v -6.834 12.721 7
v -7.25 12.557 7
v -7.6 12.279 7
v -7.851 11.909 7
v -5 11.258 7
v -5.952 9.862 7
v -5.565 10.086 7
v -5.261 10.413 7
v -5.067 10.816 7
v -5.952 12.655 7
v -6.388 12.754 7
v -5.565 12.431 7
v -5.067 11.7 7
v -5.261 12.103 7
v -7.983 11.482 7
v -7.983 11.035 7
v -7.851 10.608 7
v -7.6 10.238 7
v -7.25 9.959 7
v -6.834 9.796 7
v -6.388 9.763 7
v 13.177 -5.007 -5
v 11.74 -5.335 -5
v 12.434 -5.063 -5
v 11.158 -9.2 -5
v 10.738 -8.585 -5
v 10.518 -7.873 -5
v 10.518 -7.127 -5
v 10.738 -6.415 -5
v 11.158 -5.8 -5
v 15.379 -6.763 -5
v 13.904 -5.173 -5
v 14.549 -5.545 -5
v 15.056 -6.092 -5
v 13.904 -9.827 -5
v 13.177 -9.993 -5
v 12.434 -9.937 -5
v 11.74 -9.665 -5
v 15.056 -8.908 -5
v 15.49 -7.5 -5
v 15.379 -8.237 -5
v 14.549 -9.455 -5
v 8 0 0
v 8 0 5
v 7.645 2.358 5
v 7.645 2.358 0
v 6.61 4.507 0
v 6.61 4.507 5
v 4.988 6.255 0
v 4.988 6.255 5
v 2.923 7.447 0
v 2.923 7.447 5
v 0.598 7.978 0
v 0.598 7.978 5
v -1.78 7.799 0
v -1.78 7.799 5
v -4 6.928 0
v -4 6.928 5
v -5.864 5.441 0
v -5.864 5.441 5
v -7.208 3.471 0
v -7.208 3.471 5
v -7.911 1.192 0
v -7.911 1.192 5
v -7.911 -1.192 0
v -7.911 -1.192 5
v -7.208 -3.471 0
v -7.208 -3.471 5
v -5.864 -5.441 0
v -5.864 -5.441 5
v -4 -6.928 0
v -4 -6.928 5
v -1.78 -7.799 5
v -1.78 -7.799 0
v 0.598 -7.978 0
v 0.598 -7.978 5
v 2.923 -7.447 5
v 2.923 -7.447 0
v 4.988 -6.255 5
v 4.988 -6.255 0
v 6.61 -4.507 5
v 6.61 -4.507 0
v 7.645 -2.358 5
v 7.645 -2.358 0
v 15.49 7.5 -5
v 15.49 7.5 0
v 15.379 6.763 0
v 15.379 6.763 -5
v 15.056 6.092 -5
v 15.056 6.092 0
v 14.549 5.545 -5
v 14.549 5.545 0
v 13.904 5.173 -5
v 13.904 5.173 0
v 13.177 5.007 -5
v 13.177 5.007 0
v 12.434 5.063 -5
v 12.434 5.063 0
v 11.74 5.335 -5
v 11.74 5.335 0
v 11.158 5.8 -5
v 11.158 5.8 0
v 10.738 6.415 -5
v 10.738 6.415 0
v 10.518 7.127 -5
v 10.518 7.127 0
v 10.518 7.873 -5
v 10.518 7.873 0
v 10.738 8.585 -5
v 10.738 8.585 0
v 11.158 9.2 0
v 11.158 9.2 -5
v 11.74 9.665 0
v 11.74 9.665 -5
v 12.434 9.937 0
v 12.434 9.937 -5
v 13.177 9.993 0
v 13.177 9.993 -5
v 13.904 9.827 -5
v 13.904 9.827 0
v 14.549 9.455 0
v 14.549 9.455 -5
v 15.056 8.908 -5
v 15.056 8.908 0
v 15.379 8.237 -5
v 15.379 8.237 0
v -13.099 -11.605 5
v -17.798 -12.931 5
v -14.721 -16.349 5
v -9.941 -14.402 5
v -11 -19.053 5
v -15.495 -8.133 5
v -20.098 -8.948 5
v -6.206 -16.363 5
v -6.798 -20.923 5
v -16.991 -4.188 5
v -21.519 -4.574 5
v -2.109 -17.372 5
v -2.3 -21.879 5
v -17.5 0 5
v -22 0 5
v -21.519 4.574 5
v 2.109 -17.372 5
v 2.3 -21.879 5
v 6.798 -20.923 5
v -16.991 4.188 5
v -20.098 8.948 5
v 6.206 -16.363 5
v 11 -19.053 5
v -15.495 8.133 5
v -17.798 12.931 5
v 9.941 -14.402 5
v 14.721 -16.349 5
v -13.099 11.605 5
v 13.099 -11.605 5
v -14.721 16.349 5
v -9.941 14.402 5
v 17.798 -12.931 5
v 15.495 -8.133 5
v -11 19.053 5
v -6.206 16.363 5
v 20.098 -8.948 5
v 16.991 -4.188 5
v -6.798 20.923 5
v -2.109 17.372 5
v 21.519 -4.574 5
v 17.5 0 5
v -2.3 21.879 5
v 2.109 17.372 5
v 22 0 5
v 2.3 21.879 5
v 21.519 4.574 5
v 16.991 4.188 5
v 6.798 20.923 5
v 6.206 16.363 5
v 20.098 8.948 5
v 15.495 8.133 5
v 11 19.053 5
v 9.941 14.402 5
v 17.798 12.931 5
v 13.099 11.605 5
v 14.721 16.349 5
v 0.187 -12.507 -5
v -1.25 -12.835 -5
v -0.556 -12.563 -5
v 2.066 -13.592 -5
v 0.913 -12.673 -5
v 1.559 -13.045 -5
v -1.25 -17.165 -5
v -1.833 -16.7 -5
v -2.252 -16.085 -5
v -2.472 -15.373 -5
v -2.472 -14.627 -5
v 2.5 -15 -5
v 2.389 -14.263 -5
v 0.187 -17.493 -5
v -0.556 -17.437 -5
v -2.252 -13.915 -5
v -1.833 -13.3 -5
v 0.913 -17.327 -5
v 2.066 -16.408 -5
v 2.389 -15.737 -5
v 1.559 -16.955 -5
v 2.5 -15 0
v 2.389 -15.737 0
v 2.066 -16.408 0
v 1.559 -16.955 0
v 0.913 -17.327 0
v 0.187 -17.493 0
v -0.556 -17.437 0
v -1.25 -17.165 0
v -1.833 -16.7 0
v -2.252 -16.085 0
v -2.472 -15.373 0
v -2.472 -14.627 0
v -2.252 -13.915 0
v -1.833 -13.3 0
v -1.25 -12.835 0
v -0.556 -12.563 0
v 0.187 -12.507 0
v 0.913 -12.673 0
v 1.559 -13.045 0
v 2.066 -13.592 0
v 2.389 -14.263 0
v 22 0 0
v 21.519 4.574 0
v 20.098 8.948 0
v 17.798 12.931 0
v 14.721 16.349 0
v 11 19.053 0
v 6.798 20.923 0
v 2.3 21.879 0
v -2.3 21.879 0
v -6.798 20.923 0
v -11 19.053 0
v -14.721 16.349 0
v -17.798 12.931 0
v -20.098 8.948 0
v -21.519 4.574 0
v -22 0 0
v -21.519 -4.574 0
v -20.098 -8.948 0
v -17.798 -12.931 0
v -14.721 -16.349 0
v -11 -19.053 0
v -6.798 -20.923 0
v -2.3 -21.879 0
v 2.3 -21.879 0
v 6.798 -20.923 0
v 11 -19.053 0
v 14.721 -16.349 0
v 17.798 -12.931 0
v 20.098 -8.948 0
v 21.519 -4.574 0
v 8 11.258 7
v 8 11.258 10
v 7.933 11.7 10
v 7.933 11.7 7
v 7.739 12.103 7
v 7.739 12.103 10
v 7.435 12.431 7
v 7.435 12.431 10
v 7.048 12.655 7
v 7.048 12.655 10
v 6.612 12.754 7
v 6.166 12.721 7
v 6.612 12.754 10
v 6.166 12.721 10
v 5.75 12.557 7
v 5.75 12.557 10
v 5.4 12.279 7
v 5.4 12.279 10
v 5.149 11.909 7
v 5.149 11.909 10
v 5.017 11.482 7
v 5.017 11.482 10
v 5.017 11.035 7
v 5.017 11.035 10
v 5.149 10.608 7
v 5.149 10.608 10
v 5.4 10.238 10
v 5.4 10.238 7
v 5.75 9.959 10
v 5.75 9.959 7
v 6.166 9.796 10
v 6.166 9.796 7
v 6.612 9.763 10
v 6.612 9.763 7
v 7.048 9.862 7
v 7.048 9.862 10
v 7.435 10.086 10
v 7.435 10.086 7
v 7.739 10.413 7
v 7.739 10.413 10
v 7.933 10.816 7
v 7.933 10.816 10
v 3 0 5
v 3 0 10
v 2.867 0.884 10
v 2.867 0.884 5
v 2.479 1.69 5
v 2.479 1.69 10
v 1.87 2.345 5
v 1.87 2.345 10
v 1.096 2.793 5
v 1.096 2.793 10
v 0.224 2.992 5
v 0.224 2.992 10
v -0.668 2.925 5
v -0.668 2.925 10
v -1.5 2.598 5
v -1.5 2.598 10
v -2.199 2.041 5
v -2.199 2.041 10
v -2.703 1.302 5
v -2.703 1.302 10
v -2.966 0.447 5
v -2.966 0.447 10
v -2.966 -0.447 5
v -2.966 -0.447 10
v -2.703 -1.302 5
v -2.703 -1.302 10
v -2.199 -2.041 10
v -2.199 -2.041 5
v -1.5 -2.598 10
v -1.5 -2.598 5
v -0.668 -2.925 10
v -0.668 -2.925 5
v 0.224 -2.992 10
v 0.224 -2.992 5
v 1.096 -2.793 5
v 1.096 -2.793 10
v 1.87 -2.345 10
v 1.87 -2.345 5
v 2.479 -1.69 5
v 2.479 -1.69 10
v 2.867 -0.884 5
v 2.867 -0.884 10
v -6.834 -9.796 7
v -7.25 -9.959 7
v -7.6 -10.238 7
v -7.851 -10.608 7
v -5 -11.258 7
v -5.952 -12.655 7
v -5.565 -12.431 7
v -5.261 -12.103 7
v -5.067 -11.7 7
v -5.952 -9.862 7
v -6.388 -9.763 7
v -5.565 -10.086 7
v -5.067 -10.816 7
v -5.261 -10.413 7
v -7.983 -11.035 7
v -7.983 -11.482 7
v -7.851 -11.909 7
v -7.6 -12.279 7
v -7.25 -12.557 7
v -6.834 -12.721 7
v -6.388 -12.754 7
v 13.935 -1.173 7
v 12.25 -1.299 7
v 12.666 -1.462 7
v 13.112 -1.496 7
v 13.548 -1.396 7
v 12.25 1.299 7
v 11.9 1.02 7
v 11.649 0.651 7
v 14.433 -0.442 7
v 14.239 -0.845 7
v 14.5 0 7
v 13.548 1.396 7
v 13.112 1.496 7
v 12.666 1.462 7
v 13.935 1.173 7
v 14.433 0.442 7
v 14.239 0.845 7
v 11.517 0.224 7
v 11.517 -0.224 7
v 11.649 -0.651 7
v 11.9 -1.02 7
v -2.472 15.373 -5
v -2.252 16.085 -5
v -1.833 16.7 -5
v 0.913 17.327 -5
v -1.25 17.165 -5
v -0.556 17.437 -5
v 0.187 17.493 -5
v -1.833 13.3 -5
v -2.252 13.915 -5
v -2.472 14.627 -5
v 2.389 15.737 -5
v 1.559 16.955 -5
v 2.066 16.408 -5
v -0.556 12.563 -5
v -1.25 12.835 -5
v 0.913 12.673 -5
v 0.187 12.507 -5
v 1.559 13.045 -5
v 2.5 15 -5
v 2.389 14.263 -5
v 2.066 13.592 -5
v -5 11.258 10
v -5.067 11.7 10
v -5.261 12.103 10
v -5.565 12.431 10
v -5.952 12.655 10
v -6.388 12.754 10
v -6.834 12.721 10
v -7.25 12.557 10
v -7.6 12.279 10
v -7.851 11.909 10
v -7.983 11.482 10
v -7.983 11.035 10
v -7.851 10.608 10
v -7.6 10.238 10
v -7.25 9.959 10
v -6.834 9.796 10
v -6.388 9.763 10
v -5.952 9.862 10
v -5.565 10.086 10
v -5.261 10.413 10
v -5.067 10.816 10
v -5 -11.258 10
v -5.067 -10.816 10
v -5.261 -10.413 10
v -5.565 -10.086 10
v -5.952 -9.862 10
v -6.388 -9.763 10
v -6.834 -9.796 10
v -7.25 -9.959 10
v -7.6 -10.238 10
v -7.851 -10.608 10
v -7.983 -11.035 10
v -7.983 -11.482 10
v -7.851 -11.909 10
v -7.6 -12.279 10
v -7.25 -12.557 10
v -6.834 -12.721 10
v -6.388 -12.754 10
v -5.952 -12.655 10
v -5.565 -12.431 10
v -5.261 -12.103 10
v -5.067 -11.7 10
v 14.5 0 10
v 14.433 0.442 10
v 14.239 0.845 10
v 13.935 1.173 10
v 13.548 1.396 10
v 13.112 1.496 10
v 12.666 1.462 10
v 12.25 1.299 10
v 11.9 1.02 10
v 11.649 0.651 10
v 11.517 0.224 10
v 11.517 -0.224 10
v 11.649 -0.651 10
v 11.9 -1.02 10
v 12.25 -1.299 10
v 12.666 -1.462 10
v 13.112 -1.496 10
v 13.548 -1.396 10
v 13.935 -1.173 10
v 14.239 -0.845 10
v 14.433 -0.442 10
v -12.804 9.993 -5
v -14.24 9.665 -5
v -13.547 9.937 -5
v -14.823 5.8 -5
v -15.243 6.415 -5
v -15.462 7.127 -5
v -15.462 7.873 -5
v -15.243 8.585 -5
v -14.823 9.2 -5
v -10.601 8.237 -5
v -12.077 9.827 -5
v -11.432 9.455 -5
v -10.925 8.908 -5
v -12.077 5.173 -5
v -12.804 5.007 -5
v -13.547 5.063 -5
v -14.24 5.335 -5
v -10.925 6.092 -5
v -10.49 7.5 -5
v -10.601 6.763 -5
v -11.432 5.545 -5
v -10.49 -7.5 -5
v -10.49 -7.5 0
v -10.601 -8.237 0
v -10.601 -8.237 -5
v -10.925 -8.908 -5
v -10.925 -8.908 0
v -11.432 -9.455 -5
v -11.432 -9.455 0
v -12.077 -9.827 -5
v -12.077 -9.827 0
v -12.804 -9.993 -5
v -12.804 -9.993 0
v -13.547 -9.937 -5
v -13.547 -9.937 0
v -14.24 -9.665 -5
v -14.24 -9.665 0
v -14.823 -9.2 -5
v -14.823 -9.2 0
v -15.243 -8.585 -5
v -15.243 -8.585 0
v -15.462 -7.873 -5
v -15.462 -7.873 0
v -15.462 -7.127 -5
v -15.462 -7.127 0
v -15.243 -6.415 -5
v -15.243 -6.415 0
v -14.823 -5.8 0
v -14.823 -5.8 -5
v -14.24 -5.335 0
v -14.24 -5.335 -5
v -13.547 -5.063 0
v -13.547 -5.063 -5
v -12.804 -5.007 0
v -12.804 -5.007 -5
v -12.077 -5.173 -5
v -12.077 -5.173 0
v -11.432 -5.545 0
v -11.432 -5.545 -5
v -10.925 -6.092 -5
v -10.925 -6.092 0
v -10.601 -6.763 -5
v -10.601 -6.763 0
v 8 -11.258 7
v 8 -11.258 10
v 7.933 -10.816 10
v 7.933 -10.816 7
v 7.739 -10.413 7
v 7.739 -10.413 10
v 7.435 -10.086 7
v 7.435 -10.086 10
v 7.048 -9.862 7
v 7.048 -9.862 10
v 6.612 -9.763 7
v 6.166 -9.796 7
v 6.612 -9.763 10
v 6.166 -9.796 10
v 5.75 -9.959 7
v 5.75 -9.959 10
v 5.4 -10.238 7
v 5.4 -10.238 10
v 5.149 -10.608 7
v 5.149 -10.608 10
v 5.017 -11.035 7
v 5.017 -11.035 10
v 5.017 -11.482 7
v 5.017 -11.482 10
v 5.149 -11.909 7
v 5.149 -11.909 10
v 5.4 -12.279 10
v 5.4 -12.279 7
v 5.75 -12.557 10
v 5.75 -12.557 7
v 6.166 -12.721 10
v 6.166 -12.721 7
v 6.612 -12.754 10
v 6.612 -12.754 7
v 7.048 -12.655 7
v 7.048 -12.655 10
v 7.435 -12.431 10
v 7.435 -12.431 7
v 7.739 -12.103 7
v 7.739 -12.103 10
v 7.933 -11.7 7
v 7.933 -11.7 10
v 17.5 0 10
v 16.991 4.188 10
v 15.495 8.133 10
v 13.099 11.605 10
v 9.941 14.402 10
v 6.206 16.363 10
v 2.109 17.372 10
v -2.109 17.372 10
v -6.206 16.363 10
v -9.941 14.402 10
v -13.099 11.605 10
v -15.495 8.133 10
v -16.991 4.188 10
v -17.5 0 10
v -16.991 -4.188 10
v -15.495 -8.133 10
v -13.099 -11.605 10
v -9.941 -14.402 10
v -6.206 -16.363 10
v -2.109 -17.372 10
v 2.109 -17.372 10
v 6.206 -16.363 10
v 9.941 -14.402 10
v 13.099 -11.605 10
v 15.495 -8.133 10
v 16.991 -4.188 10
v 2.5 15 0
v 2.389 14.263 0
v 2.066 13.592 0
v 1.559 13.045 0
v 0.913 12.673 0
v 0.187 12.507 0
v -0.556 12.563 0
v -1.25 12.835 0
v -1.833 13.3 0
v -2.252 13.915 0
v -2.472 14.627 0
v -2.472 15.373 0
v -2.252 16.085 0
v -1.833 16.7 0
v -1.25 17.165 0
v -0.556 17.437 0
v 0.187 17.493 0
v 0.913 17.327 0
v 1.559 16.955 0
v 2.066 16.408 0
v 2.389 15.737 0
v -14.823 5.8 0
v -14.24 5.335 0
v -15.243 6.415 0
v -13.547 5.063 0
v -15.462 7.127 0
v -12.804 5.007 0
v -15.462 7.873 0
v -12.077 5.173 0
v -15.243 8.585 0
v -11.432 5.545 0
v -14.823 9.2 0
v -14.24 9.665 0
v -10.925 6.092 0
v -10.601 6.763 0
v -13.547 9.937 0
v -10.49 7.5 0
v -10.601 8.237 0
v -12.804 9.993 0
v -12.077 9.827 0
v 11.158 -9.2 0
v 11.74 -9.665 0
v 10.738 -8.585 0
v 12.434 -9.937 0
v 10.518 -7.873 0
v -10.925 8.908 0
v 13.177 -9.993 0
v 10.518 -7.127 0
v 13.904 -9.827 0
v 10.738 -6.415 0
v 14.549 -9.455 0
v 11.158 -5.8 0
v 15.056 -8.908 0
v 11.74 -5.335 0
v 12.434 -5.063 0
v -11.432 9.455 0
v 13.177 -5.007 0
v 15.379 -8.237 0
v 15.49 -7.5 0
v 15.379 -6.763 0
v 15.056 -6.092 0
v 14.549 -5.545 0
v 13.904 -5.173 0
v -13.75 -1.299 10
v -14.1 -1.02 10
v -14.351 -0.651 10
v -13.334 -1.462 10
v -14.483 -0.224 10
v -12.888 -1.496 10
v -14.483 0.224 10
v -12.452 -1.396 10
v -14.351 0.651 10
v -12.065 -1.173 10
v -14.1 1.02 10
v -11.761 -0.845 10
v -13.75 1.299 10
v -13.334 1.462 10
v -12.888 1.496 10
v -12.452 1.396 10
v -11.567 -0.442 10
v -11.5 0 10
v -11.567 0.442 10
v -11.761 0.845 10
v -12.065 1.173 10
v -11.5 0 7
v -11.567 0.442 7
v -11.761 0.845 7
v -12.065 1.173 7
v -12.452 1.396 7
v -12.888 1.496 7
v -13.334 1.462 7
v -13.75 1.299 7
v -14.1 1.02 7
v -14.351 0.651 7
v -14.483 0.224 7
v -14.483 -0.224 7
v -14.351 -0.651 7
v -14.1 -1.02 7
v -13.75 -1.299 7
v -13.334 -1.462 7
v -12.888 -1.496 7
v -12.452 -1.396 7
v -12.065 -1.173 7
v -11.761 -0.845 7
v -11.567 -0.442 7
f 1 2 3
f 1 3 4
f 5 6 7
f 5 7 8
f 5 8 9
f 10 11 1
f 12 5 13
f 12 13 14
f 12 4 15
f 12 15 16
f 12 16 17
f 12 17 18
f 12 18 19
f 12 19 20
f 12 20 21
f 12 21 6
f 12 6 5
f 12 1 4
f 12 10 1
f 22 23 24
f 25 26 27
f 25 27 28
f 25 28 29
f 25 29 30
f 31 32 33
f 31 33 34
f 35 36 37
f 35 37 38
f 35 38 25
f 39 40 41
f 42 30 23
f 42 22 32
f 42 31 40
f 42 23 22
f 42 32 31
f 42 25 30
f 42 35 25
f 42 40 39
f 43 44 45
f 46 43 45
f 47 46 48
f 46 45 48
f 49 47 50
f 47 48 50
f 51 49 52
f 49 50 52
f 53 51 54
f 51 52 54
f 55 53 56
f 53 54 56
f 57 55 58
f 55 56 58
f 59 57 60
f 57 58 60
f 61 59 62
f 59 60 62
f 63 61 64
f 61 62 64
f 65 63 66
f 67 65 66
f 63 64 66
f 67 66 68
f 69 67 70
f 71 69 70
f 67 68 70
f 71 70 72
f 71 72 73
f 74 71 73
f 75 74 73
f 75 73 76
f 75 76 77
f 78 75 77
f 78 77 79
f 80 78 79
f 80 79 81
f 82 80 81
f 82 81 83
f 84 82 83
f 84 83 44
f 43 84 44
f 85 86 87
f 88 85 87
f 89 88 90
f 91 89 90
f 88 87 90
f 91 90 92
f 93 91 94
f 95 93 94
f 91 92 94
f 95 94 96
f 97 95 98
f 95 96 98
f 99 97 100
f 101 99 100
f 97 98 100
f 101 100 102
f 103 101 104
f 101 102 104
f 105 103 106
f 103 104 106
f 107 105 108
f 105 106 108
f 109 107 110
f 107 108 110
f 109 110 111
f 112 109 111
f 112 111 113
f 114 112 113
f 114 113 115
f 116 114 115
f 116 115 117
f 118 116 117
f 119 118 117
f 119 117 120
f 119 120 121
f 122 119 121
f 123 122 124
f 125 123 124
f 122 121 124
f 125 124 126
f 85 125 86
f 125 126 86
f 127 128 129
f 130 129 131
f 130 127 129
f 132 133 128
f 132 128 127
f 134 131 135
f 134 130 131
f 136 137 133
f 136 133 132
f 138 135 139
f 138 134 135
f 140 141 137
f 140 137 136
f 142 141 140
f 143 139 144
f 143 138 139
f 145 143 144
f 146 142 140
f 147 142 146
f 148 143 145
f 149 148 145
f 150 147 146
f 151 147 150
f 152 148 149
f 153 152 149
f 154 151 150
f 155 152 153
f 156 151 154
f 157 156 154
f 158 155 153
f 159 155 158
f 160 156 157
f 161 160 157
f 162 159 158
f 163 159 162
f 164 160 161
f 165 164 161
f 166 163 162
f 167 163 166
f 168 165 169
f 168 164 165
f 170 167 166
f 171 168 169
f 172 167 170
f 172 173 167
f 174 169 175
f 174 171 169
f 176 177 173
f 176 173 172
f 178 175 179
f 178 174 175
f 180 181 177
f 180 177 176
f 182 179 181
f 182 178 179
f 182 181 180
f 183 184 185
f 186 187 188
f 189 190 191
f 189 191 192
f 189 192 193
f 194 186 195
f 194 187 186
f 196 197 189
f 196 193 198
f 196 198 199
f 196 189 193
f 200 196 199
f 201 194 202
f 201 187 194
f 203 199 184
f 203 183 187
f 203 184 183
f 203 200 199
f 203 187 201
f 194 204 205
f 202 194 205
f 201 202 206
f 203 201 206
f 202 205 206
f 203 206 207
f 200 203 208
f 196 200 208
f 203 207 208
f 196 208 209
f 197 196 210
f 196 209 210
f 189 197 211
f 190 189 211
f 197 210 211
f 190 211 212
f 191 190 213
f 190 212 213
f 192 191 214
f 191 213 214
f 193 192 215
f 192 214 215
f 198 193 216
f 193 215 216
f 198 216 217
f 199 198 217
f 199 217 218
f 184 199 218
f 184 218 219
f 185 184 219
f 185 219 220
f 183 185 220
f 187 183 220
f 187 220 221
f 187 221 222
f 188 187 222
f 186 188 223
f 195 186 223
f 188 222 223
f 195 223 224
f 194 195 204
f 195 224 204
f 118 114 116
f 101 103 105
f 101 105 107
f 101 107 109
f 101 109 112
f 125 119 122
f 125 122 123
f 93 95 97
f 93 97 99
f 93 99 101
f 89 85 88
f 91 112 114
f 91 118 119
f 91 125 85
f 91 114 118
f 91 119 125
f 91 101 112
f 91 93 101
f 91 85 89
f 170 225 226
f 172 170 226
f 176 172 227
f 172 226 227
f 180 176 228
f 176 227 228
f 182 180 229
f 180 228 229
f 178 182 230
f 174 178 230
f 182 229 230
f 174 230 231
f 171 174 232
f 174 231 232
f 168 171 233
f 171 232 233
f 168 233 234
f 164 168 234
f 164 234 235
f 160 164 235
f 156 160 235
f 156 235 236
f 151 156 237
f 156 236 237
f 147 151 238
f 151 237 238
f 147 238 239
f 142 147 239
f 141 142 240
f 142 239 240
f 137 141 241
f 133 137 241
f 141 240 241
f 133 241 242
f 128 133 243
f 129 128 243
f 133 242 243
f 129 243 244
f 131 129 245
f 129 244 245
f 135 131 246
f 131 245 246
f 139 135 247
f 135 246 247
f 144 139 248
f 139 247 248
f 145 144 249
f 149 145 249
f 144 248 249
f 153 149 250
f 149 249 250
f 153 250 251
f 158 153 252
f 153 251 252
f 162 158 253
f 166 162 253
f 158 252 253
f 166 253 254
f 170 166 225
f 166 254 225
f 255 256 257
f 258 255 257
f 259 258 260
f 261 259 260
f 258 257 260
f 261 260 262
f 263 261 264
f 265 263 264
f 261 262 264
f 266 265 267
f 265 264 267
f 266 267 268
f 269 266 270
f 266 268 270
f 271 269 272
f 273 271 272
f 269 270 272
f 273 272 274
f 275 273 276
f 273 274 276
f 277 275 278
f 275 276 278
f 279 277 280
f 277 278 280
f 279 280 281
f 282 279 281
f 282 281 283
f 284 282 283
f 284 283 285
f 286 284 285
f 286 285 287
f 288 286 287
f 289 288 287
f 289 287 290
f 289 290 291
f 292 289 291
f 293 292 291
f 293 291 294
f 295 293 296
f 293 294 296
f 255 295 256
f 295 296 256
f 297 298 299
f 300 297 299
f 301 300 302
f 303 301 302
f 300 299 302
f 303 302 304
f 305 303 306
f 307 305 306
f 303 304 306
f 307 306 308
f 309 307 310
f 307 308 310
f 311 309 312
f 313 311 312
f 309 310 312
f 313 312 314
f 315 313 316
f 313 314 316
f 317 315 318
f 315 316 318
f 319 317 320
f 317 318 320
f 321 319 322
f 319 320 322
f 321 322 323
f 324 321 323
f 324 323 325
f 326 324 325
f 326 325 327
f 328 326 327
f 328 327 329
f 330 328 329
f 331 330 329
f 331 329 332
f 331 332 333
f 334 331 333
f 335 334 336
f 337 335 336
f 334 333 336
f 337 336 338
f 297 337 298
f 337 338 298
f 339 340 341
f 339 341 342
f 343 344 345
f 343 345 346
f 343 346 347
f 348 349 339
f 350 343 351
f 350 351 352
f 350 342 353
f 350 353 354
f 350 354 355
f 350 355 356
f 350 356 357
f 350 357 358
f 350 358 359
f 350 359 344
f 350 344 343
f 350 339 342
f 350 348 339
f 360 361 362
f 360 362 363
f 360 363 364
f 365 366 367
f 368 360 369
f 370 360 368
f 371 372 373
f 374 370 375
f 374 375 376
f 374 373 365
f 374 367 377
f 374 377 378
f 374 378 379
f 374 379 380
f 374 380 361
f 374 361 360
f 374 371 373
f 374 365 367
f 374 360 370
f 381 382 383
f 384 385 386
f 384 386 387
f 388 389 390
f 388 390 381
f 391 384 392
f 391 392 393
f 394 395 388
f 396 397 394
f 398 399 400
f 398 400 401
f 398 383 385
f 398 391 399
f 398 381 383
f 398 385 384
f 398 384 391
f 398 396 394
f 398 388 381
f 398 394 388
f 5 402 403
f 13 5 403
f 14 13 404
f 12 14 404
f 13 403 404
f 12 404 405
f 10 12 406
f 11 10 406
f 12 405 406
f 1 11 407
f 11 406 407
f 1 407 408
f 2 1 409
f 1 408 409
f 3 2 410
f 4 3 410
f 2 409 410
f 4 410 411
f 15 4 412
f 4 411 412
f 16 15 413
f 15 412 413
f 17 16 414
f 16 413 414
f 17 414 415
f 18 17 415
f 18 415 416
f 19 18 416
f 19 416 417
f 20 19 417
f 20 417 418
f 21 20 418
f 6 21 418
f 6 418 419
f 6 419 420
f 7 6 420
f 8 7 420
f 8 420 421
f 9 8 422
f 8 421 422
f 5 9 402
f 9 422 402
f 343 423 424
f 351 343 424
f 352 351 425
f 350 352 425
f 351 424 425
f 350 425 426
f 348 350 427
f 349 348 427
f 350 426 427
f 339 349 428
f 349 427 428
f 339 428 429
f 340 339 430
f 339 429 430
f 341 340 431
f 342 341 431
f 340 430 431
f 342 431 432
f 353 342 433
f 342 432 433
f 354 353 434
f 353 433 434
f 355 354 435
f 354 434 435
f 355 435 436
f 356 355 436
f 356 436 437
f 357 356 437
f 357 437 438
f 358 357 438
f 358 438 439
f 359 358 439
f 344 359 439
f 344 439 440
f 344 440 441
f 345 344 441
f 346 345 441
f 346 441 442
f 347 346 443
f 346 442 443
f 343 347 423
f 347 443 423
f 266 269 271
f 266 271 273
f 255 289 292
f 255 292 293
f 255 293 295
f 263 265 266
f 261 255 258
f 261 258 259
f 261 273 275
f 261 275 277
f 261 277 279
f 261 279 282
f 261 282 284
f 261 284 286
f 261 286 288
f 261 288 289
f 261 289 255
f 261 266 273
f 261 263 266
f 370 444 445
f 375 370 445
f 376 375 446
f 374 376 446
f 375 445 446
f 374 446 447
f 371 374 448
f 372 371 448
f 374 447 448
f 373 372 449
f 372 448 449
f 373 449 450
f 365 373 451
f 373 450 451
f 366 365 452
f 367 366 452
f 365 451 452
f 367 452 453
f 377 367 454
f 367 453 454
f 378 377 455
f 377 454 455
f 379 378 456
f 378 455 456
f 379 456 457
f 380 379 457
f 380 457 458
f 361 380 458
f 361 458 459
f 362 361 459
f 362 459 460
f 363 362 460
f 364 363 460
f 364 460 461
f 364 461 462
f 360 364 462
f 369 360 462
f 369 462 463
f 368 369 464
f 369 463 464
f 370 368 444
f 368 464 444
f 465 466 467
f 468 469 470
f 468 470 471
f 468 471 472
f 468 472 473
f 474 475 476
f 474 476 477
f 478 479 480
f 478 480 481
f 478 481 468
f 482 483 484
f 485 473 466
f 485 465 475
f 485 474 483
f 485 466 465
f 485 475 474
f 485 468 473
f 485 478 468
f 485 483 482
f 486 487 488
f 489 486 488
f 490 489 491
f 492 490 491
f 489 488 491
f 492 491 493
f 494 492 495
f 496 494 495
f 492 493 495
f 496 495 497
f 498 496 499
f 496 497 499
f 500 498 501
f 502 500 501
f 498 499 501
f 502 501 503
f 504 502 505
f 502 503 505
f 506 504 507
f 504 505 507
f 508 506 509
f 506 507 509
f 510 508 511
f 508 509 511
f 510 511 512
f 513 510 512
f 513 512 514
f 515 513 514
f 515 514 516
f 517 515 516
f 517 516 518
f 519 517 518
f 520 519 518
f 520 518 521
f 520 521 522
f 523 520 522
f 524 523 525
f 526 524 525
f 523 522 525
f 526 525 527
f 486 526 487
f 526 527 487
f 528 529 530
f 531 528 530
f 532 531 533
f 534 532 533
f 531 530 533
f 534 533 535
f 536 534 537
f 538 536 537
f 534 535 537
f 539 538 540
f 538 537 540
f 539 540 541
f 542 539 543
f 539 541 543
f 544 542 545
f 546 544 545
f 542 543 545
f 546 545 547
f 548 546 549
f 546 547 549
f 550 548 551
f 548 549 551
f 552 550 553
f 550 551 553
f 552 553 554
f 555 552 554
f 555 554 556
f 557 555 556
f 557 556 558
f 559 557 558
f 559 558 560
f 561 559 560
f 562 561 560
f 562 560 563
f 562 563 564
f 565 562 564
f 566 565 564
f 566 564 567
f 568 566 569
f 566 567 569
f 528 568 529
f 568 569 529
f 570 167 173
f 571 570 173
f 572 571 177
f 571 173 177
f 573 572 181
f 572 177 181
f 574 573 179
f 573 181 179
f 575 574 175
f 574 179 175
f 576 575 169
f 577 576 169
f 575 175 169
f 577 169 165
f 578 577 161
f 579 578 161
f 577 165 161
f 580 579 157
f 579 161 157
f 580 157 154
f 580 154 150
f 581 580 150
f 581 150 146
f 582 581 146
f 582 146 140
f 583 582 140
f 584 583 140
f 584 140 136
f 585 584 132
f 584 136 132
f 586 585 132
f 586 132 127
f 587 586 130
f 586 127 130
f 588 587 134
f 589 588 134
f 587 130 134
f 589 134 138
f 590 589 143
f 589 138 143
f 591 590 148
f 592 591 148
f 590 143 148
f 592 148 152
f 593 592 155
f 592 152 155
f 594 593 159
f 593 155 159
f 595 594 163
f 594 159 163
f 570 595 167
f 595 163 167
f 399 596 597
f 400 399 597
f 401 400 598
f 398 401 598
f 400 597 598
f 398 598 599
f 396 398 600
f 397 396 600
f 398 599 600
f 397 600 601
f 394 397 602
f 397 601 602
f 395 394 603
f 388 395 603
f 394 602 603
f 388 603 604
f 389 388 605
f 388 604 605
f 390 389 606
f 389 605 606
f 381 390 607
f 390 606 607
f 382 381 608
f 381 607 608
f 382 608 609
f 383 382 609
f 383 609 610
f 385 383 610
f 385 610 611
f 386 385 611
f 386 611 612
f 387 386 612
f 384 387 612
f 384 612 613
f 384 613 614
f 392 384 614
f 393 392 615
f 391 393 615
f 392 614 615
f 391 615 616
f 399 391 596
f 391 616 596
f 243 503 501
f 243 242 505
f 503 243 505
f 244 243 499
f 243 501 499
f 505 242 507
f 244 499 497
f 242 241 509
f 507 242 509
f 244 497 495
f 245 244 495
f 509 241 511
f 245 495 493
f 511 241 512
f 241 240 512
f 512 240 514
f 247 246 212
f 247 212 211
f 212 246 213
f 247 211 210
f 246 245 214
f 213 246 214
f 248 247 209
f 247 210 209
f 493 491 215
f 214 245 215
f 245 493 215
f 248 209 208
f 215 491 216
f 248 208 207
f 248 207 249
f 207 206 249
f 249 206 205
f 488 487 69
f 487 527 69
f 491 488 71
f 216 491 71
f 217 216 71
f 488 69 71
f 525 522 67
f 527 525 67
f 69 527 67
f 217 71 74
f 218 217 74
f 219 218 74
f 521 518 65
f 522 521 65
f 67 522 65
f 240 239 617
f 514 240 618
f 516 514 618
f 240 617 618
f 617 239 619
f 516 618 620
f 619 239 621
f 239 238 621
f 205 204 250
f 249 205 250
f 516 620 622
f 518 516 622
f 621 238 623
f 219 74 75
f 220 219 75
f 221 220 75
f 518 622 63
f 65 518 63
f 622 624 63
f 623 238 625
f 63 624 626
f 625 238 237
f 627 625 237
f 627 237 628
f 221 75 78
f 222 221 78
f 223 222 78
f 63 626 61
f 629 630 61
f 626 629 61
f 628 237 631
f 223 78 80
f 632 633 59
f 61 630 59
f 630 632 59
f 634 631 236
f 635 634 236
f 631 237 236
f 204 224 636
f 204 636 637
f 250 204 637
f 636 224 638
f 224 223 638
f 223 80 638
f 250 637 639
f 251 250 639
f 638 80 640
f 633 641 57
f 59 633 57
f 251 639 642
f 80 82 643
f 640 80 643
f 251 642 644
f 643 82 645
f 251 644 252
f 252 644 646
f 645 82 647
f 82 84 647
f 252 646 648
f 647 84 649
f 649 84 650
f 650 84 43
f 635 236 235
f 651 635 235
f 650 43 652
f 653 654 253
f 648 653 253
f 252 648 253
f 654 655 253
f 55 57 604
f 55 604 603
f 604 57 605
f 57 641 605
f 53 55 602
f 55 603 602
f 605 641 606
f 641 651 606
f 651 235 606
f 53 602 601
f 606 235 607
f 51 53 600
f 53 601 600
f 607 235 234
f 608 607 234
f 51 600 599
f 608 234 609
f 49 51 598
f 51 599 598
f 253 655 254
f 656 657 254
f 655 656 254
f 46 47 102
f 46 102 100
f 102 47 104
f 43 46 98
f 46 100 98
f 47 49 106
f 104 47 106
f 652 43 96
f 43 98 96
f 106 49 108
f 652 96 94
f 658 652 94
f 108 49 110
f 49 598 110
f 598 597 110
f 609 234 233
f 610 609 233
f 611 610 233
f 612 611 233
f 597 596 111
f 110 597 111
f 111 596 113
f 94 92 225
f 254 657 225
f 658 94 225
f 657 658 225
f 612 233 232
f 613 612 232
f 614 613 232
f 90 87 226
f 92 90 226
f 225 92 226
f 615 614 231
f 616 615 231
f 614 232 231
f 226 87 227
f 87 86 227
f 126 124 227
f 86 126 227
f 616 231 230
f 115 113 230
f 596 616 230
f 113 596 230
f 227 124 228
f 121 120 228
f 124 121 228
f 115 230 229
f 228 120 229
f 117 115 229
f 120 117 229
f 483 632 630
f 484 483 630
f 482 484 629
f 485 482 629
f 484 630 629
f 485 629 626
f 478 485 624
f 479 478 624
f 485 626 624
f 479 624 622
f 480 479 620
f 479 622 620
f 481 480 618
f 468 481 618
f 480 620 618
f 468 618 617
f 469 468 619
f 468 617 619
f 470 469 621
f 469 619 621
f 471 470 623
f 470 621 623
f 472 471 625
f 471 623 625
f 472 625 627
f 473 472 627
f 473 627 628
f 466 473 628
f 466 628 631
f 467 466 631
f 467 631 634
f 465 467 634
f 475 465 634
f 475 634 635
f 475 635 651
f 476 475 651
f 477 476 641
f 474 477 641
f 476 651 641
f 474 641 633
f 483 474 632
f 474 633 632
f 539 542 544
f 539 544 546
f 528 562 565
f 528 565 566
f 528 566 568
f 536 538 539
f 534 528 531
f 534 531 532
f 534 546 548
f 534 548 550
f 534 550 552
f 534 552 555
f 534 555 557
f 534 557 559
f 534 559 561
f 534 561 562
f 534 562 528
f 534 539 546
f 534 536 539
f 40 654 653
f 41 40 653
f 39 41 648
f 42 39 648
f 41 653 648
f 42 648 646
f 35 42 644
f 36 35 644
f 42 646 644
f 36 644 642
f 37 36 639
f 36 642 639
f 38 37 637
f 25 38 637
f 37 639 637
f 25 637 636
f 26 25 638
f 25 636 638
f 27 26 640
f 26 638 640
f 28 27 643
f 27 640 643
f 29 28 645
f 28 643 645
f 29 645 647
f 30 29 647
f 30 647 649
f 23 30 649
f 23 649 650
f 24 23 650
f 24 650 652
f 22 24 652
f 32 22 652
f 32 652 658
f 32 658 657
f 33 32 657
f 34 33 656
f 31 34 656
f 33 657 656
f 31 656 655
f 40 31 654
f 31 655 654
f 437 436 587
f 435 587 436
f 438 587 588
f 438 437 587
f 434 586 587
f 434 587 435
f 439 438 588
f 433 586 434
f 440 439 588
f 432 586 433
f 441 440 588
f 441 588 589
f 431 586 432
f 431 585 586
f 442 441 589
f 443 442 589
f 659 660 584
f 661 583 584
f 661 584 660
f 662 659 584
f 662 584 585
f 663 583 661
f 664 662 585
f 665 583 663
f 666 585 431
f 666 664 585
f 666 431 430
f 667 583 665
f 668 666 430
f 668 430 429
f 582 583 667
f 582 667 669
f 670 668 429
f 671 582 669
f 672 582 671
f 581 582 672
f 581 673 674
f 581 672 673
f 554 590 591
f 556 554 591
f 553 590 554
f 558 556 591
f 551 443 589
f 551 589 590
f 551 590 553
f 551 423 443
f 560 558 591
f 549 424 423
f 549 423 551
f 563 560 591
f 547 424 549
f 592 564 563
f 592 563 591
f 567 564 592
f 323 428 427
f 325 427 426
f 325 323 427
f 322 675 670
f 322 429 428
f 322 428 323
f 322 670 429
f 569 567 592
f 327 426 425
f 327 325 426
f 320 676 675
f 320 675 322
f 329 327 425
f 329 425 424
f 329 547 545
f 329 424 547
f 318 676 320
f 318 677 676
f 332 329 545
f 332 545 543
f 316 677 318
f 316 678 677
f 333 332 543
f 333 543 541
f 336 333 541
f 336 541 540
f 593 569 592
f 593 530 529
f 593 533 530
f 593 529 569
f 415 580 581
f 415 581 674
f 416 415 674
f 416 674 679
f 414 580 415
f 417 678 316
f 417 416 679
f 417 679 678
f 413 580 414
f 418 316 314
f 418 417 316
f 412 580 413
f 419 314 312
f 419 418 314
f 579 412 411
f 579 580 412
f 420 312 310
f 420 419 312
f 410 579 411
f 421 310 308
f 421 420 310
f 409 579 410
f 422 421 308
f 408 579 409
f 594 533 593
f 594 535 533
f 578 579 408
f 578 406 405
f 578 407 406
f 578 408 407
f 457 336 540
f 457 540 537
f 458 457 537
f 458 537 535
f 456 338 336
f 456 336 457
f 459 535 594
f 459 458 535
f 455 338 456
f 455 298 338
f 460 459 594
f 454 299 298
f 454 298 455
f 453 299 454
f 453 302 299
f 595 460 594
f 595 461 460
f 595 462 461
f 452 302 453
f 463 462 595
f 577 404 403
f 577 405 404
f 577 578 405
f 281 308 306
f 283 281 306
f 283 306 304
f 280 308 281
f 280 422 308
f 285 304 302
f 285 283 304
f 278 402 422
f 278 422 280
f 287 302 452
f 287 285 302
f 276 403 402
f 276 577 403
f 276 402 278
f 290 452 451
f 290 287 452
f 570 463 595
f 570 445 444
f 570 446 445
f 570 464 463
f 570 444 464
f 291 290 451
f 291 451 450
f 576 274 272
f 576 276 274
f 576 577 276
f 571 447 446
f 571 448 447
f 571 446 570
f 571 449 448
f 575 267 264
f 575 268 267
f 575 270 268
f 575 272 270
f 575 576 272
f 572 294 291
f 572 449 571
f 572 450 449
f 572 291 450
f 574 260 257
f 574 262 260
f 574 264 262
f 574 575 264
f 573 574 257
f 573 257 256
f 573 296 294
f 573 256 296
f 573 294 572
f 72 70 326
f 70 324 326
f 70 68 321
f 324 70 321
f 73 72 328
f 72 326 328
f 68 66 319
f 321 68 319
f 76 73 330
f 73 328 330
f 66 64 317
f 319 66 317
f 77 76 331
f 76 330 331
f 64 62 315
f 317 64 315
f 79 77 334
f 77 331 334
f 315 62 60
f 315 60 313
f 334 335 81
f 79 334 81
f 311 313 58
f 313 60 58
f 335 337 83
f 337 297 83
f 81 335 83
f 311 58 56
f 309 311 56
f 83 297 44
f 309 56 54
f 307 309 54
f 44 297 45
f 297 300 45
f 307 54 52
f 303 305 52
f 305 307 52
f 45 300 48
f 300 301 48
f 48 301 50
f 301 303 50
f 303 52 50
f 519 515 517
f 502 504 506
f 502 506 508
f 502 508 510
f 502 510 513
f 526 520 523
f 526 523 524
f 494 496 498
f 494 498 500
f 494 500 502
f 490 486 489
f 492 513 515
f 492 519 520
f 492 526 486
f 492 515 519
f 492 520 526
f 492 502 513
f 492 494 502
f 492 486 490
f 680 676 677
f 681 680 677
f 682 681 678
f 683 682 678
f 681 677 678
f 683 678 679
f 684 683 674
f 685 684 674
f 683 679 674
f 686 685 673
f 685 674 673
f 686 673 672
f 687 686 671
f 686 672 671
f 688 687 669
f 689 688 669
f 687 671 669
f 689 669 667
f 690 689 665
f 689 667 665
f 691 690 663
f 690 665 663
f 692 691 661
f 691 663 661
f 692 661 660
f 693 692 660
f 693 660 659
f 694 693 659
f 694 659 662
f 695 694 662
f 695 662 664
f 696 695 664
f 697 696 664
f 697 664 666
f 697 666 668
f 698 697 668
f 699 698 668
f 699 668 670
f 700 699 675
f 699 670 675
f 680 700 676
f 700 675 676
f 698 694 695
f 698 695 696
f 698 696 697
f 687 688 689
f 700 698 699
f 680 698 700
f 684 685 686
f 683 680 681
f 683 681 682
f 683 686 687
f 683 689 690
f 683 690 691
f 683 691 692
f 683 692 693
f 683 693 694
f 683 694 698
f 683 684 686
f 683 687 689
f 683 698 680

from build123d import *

# Parameters (mm, degrees)
SKETCH1_R           = 22
BOSS_EXTRUDE1_DEPTH = 5
SKETCH2_R           = 17.5
BOSS_EXTRUDE2_DEPTH = 5
SKETCH4_R           = 8
CUT_EXTRUDE2_DEPTH  = 10
SKETCH5_R           = 1.5
CUT_EXTRUDE3_DEPTH  = 3
SKETCH7_R           = 2.5
BOSS_EXTRUDE4_DEPTH = 5
SKETCH8_R           = 8
SKETCH8_R_2         = 3
BOSS_EXTRUDE5_DEPTH = 5


with BuildPart() as part:
    # Sketch1 → Boss-Extrude1 (new body)
    with BuildSketch(Plane.XY):
        Circle(SKETCH1_R)
    extrude(amount=BOSS_EXTRUDE1_DEPTH)

    # Sketch2 → Boss-Extrude2 (add)
    with BuildSketch(Plane.XY.offset(5)):
        Circle(SKETCH2_R)
    extrude(amount=BOSS_EXTRUDE2_DEPTH)

    # Sketch4 → Cut-Extrude2 (cut)
    with BuildSketch(Plane.XY.offset(10)):
        Circle(SKETCH4_R)
    extrude(amount=-CUT_EXTRUDE2_DEPTH, mode=Mode.SUBTRACT)

    # Sketch5 → Cut-Extrude3 (cut)
    with BuildSketch(Plane.XY.offset(10)):
        with Locations((13, 0)):
            Circle(SKETCH5_R)
        with Locations((6.5, -11.258330249)):
            Circle(SKETCH5_R)
        with Locations((-6.5, -11.258330249)):
            Circle(SKETCH5_R)
        with Locations((-13, 0)):
            Circle(SKETCH5_R)
        with Locations((-6.5, 11.258330249)):
            Circle(SKETCH5_R)
        with Locations((6.5, 11.258330249)):
            Circle(SKETCH5_R)
    extrude(amount=-CUT_EXTRUDE3_DEPTH, mode=Mode.SUBTRACT)

    # Sketch7 → Boss-Extrude4 (add)
    with BuildSketch(Plane(origin=(0, 0, 0), x_dir=(-1, 0, 0), z_dir=(0, 0, -1))):
        with Locations(Location((0, 15, 0), (0, 0, 180))):
            Circle(SKETCH7_R)
        with Locations(Location((12.990381057, 7.5, 0), (0, 0, 180))):
            Circle(SKETCH7_R)
        with Locations(Location((12.990381057, -7.5, 0), (0, 0, 180))):
            Circle(SKETCH7_R)
        with Locations(Location((0, -15, 0), (0, 0, 180))):
            Circle(SKETCH7_R)
        with Locations(Location((-12.990381057, -7.5, 0), (0, 0, 180))):
            Circle(SKETCH7_R)
        with Locations(Location((-12.990381057, 7.5, 0), (0, 0, 180))):
            Circle(SKETCH7_R)
    extrude(amount=BOSS_EXTRUDE4_DEPTH)

    # Sketch8 → Boss-Extrude5 (add)
    with BuildSketch(Plane.XY.offset(10)):
        Circle(SKETCH8_R)
        Circle(SKETCH8_R_2, mode=Mode.SUBTRACT)
    extrude(amount=-BOSS_EXTRUDE5_DEPTH)


solid = part.part
